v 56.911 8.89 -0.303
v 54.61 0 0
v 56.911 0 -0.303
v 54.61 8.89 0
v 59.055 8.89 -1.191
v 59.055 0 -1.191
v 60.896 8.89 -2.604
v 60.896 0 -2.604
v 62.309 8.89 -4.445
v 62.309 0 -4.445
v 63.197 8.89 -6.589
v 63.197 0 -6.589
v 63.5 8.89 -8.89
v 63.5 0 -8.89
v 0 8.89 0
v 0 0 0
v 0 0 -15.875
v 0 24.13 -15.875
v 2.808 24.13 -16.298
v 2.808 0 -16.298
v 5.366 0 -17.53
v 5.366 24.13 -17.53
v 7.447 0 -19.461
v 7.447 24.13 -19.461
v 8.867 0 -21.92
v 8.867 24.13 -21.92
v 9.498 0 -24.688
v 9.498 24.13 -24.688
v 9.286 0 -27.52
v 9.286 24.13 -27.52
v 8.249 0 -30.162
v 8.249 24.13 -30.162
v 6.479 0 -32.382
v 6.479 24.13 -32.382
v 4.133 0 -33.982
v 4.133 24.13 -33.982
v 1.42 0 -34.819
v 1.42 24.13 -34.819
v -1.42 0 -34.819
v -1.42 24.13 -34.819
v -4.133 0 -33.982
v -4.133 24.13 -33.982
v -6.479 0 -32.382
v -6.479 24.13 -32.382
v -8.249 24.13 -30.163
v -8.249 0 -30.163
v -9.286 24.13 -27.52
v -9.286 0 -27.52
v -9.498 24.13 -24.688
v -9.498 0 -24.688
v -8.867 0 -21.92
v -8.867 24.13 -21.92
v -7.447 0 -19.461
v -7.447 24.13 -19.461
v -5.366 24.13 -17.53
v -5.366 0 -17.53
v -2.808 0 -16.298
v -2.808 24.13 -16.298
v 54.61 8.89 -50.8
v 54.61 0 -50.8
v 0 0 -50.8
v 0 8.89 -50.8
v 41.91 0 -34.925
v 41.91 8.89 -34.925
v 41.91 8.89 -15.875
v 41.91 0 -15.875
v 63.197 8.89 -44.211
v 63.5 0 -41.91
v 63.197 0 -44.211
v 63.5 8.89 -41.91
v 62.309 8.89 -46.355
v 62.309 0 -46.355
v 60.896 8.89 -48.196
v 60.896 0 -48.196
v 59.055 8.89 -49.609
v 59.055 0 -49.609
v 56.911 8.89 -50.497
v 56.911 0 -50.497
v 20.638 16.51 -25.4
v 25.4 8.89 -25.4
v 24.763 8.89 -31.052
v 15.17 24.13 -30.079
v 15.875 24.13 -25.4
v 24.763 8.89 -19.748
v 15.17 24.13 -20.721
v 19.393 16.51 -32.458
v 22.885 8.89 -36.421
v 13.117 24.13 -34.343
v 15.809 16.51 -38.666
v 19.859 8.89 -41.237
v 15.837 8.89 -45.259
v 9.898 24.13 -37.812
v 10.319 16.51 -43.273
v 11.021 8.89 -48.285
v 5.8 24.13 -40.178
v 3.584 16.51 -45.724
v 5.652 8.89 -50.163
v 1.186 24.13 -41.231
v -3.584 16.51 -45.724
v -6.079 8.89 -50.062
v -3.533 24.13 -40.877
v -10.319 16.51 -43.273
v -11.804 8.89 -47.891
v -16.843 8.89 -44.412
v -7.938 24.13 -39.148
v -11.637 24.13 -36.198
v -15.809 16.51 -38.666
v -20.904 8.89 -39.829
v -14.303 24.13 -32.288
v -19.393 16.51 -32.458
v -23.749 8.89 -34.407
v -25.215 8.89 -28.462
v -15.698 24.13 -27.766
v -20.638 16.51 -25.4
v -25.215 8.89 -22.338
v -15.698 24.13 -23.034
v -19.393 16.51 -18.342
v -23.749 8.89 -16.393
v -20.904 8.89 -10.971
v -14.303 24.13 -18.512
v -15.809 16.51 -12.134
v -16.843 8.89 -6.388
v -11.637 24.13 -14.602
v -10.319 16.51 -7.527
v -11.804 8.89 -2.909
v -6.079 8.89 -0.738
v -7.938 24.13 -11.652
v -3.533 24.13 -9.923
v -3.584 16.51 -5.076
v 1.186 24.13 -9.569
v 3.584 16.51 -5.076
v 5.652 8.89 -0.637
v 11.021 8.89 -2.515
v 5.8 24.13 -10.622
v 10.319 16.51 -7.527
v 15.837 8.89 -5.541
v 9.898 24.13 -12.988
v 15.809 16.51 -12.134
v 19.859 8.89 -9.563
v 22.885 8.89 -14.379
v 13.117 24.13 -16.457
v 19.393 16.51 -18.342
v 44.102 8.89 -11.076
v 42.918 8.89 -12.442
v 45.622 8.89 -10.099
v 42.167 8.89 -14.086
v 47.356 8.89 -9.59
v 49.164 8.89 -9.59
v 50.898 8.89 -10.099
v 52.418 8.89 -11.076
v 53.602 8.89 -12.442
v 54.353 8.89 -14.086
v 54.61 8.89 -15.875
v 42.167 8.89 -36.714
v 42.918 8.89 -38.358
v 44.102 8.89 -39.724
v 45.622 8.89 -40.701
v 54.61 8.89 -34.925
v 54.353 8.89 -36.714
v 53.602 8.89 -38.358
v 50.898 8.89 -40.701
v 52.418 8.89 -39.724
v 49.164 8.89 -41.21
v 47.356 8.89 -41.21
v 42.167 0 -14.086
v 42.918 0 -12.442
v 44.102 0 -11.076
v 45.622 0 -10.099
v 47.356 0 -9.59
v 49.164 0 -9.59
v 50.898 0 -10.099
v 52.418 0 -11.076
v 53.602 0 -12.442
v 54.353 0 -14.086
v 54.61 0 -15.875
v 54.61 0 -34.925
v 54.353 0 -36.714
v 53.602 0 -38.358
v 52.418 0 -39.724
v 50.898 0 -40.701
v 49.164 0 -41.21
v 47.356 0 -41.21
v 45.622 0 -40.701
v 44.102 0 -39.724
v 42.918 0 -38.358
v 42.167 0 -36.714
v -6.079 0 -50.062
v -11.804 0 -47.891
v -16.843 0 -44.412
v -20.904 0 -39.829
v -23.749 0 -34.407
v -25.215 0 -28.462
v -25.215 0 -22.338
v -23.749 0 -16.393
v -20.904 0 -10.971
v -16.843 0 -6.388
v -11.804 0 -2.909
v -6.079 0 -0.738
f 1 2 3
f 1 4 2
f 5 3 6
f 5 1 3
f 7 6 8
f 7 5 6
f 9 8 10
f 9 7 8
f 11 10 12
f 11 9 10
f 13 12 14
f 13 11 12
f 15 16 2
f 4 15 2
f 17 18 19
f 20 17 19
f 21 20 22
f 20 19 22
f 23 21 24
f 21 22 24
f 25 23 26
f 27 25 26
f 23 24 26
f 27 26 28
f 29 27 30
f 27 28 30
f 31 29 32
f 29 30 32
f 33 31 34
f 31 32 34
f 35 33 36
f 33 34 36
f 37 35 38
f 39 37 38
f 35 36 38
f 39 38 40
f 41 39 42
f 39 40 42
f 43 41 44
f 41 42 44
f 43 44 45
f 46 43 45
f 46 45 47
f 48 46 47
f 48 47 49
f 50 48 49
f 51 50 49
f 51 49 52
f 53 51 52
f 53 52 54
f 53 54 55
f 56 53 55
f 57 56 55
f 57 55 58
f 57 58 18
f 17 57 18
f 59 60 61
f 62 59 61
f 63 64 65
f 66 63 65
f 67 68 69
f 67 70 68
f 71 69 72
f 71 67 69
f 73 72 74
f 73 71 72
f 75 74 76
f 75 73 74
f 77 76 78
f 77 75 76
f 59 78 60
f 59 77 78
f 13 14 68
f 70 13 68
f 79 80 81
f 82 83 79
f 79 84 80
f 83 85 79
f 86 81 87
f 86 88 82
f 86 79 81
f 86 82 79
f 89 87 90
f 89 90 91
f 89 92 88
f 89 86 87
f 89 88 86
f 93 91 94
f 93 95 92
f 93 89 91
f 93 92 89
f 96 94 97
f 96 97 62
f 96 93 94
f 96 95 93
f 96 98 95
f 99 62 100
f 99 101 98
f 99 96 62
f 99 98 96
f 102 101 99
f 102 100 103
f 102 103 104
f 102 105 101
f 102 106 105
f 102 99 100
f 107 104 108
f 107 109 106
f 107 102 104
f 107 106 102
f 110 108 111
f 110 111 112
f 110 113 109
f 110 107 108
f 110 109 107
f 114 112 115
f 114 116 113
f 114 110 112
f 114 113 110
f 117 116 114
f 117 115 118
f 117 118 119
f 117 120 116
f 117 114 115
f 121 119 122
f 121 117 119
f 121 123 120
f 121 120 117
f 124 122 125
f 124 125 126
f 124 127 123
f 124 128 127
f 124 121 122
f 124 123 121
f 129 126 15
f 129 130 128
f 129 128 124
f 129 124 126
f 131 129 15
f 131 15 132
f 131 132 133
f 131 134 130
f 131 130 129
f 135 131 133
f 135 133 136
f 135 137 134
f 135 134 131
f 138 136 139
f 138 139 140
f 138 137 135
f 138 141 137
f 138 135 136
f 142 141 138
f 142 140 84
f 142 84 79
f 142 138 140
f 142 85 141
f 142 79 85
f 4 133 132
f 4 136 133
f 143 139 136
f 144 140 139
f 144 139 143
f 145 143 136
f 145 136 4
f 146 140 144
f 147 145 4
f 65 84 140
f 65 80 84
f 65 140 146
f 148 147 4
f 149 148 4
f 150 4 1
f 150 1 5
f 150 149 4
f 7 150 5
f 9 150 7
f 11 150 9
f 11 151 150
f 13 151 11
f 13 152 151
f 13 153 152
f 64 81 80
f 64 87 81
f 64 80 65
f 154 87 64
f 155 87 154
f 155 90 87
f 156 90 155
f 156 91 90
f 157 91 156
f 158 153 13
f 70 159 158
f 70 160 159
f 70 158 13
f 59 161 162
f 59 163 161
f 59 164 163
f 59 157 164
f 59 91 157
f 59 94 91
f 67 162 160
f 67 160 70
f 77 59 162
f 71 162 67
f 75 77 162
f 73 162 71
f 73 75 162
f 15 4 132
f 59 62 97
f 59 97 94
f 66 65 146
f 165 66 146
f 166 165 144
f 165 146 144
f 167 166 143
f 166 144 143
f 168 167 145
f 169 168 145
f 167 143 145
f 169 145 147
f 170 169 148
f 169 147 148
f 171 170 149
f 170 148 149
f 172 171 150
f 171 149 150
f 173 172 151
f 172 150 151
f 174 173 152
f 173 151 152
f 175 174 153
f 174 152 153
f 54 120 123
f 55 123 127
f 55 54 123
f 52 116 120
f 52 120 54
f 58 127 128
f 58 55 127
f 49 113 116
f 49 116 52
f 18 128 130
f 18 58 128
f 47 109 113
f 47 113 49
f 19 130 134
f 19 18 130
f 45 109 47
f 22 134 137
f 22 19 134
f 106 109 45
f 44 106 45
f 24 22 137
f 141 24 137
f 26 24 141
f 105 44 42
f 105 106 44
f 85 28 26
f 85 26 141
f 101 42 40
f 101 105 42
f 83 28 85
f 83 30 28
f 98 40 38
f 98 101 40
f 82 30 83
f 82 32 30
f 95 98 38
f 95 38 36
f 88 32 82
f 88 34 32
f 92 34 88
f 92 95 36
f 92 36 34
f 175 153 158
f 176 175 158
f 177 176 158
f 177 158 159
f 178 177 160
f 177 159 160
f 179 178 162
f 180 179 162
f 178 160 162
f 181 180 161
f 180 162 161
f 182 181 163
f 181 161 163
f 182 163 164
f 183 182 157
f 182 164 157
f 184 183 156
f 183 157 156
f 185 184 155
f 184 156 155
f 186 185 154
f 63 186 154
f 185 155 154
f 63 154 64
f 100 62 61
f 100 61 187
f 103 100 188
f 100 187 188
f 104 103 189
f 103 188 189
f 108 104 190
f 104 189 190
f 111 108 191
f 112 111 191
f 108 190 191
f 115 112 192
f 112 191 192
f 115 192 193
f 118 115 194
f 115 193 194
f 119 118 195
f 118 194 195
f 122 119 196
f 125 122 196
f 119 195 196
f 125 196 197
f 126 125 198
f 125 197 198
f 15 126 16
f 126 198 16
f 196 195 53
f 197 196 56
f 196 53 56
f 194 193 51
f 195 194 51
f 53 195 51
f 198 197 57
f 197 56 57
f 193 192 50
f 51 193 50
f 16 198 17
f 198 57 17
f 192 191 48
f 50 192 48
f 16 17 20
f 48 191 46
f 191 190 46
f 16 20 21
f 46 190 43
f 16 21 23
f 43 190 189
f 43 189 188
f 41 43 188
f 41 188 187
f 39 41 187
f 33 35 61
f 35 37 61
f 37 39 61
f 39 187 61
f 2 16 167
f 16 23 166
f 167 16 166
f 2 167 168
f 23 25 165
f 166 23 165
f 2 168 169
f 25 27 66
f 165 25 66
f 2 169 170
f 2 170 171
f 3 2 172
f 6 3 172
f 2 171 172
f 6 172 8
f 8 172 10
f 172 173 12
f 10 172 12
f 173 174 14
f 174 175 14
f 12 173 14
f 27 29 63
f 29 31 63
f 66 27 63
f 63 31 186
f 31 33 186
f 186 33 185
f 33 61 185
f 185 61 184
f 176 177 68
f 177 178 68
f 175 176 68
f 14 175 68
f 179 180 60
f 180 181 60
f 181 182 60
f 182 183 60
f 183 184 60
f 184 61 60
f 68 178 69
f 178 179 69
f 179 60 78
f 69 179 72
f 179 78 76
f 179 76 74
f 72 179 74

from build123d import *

# Parameters (mm, degrees)
BOSS_EXTRUDE1_DEPTH = 8.89
CUT_EXTRUDE2_DEPTH  = 8.89
FILLET1_R           = 8.89
SKETCH4_R           = 25.4
SKETCH11_R          = 15.875
SKETCH12_R          = 9.525
CUT_EXTRUDE3_DEPTH  = 25.13


with BuildPart() as part:
    # Sketch1 → Boss-Extrude1 (new body)
    with BuildSketch(Plane(origin=(0, 0, 0), x_dir=(1, 0, 0), z_dir=(0, 1, 0))):
        with BuildLine():
            Line((0, 0), (63.5, 0))
            Line((63.5, 0), (63.5, 50.8))
            Line((63.5, 50.8), (0, 50.8))
            ThreePointArc((0, 50.8), (-25.4, 25.4), (0, 0))
        make_face()
    extrude(amount=BOSS_EXTRUDE1_DEPTH)

    # Sketch2 → Cut-Extrude2 (cut)
    with BuildSketch(Plane(origin=(0, 8.89, 0), x_dir=(1, 0, 0), z_dir=(0, 1, 0))):
        with BuildLine():
            Line((41.91, 34.925), (41.91, 15.875))
            ThreePointArc((41.91, 15.875), (48.26, 9.525), (54.61, 15.875))
            Line((54.61, 15.875), (54.61, 34.925))
            ThreePointArc((54.61, 34.925), (48.26, 41.275), (41.91, 34.925))
        make_face()
    extrude(amount=-CUT_EXTRUDE2_DEPTH, mode=Mode.SUBTRACT)

    # Fillet1
    fillet1_edges = [part.edges().sort_by_distance(p)[0] for p in [
        (63.5, 4.445, -50.8),
        (63.5, 4.445, 0),
    ]]
    fillet(fillet1_edges, radius=FILLET1_R)

    # Sketch4 → Loft2 section 0
    with BuildSketch(Plane(origin=(0, 8.89, 0), x_dir=(1, 0, 0), z_dir=(0, 1, 0))):
        with Locations((0, 25.4)):
            Circle(SKETCH4_R)
    # Sketch11 → Loft2 section 1
    with BuildSketch(Plane(origin=(0, 24.13, 0), x_dir=(1, 0, 0), z_dir=(0, 1, 0))):
        with Locations((0, 25.4)):
            Circle(SKETCH11_R)
    loft()

    # Sketch12 → Cut-Extrude3 (cut, through all)
    with BuildSketch(Plane(origin=(0, 24.13, 0), x_dir=(1, 0, 0), z_dir=(0, 1, 0))):
        with Locations(Location((0, 25.4, 0), (0, 0, 270))):  # turned: the seam where the file's is
            Circle(SKETCH12_R)
    extrude(amount=-CUT_EXTRUDE3_DEPTH, mode=Mode.SUBTRACT)


solid = part.part
